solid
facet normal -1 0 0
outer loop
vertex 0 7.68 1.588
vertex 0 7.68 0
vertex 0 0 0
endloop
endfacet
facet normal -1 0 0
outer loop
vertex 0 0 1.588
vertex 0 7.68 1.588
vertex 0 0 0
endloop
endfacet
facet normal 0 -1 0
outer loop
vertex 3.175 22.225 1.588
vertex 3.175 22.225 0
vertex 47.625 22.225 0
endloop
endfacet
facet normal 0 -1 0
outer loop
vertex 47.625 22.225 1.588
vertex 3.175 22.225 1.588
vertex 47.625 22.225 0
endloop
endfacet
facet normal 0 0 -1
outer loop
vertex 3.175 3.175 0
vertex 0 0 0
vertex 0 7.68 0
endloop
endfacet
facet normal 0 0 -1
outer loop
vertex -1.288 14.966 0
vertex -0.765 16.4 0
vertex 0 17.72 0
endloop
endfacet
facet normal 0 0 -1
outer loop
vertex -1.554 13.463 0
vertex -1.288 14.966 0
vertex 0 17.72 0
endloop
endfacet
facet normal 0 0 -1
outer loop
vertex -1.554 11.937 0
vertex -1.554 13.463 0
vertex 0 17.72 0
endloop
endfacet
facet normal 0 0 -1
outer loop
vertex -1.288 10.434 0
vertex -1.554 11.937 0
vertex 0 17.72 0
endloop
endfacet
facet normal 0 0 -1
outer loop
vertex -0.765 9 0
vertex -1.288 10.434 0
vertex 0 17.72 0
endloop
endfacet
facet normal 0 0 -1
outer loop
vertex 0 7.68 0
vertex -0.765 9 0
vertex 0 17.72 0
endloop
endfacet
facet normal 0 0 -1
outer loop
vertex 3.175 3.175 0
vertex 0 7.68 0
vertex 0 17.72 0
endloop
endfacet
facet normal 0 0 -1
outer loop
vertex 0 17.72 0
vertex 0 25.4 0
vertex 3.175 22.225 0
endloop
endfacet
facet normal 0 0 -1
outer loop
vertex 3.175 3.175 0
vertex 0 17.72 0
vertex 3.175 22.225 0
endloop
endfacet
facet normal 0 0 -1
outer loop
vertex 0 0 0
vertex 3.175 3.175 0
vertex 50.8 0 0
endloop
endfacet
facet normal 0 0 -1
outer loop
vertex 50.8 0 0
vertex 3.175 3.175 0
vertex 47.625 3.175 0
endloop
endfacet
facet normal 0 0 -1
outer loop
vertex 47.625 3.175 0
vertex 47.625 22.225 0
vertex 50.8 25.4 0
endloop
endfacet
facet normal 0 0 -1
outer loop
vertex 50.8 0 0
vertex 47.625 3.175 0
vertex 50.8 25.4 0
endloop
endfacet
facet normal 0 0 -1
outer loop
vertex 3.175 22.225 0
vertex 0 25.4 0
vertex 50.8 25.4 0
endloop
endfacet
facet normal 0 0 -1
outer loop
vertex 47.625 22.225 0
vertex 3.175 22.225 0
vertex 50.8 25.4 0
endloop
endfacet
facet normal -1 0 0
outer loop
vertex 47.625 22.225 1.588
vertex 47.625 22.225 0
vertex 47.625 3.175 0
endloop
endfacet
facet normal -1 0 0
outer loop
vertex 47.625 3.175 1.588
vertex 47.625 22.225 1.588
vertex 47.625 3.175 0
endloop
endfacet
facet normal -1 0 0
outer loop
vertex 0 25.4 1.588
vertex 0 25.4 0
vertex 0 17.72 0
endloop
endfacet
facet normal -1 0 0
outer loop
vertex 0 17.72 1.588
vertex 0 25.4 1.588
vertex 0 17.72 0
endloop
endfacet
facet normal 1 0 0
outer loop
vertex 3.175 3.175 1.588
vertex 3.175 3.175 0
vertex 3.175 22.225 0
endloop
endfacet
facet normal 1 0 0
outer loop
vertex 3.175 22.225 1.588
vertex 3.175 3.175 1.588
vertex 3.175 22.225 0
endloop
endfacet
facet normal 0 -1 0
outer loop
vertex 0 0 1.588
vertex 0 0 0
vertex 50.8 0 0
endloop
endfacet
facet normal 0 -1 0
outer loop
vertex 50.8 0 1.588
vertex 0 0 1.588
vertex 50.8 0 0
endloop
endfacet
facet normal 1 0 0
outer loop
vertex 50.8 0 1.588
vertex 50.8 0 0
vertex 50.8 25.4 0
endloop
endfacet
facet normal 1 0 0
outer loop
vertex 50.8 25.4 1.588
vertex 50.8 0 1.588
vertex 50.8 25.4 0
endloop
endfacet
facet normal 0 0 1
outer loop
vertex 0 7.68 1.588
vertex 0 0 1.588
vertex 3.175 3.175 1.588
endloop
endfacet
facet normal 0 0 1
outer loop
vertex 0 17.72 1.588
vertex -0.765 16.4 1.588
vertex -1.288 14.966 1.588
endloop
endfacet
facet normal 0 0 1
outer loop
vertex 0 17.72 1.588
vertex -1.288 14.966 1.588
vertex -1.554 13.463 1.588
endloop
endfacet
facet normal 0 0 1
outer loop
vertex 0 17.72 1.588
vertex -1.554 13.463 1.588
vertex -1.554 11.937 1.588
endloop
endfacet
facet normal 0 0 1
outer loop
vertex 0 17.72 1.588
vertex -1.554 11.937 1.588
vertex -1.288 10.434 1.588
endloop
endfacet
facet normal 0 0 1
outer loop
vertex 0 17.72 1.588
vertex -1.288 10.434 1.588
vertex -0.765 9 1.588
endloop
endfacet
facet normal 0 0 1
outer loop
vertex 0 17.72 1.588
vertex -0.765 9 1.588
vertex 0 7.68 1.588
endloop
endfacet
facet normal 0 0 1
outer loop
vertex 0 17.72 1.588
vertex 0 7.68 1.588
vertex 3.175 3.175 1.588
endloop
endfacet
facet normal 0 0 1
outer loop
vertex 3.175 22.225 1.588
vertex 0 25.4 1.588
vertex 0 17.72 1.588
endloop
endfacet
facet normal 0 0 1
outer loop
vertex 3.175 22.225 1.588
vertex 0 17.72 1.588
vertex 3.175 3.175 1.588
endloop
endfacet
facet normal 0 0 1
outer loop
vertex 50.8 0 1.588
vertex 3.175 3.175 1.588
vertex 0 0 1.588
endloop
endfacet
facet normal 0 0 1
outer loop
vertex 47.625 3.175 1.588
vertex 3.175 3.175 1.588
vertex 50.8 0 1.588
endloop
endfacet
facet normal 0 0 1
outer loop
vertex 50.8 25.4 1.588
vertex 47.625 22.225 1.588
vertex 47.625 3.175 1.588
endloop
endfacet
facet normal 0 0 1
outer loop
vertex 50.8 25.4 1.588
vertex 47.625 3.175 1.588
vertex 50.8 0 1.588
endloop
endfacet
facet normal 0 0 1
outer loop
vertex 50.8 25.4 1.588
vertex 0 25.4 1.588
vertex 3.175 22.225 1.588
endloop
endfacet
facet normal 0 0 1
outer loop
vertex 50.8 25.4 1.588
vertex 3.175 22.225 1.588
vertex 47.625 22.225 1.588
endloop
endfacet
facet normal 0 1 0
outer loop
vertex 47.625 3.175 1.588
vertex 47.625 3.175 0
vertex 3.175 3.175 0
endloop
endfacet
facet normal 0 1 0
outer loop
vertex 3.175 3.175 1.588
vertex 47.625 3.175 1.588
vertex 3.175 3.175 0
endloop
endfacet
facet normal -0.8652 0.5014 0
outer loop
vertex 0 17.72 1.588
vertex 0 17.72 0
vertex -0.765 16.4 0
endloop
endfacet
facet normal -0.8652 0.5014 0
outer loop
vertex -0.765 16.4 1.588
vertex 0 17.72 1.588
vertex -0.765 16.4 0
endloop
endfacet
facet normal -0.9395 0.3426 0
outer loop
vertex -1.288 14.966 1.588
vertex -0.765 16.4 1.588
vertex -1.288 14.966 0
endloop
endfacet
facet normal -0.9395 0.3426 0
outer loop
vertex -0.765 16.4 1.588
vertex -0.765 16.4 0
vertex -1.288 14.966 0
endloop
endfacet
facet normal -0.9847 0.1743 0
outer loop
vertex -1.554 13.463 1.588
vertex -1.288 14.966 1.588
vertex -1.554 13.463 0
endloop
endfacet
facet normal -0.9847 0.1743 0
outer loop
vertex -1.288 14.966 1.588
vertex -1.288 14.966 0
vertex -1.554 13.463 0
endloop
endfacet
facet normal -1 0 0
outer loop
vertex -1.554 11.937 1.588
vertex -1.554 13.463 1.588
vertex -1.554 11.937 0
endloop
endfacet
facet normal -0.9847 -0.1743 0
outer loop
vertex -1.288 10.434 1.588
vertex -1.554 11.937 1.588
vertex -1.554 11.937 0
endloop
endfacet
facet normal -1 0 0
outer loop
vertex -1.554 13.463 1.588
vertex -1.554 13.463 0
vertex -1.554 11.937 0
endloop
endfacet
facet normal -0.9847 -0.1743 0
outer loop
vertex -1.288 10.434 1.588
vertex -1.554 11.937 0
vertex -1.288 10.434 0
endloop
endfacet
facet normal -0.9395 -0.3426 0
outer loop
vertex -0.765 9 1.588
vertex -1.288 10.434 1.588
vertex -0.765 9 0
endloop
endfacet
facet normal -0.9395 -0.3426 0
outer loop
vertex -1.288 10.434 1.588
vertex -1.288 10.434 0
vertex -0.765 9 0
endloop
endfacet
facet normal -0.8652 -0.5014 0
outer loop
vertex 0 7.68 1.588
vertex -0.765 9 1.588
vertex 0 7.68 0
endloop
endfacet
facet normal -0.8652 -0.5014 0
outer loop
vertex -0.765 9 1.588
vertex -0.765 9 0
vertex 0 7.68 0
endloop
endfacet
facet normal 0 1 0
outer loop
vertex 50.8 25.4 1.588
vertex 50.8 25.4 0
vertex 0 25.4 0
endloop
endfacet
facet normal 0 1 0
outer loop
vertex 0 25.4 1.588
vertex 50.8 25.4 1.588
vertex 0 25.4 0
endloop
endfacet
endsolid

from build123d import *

# Parameters (mm, degrees)
F1_DEPTH = 1.5875


with BuildPart() as f1:
    # F0 (on Top) → F1 (new body)
    with BuildSketch(Plane.XY):
        with BuildLine():
            Line((0, 7.6798842145), (0, 0))
            Line((0, 0), (50.8, 0))
            Line((50.8, 0), (50.8, 25.4))
            Line((50.8, 25.4), (0, 25.4))
            Line((0, 25.4), (0, 17.7201157855))
            ThreePointArc((0, 17.7201157855), (1.4190494999, 19.2926118305), (3.175, 20.4771299333))
            Line((3.175, 20.4771299333), (3.175, 22.225))
            Line((3.175, 22.225), (47.625, 22.225))
            Line((47.625, 22.225), (47.625, 3.175))
            Line((47.625, 3.175), (3.175, 3.175))
            Line((3.175, 3.175), (3.175, 4.9228700667))
            ThreePointArc((3.175, 4.9228700667), (1.4190494999, 6.1073881695), (0, 7.6798842145))
        make_face()
        with BuildLine():
            ThreePointArc((0, 17.7201157855), (-1.5875, 12.7), (0, 7.6798842145))
            Line((0, 7.6798842145), (0, 17.7201157855))
        make_face()
        with BuildLine():
            Line((0, 17.7201157855), (0, 7.6798842145))
            ThreePointArc((0, 7.6798842145), (1.4190494999, 6.1073881695), (3.175, 4.9228700667))
            Line((3.175, 4.9228700667), (3.175, 20.4771299333))
            ThreePointArc((3.175, 20.4771299333), (1.4190494999, 19.2926118305), (0, 17.7201157855))
        make_face()
    extrude(amount=F1_DEPTH)


solid = f1.part
